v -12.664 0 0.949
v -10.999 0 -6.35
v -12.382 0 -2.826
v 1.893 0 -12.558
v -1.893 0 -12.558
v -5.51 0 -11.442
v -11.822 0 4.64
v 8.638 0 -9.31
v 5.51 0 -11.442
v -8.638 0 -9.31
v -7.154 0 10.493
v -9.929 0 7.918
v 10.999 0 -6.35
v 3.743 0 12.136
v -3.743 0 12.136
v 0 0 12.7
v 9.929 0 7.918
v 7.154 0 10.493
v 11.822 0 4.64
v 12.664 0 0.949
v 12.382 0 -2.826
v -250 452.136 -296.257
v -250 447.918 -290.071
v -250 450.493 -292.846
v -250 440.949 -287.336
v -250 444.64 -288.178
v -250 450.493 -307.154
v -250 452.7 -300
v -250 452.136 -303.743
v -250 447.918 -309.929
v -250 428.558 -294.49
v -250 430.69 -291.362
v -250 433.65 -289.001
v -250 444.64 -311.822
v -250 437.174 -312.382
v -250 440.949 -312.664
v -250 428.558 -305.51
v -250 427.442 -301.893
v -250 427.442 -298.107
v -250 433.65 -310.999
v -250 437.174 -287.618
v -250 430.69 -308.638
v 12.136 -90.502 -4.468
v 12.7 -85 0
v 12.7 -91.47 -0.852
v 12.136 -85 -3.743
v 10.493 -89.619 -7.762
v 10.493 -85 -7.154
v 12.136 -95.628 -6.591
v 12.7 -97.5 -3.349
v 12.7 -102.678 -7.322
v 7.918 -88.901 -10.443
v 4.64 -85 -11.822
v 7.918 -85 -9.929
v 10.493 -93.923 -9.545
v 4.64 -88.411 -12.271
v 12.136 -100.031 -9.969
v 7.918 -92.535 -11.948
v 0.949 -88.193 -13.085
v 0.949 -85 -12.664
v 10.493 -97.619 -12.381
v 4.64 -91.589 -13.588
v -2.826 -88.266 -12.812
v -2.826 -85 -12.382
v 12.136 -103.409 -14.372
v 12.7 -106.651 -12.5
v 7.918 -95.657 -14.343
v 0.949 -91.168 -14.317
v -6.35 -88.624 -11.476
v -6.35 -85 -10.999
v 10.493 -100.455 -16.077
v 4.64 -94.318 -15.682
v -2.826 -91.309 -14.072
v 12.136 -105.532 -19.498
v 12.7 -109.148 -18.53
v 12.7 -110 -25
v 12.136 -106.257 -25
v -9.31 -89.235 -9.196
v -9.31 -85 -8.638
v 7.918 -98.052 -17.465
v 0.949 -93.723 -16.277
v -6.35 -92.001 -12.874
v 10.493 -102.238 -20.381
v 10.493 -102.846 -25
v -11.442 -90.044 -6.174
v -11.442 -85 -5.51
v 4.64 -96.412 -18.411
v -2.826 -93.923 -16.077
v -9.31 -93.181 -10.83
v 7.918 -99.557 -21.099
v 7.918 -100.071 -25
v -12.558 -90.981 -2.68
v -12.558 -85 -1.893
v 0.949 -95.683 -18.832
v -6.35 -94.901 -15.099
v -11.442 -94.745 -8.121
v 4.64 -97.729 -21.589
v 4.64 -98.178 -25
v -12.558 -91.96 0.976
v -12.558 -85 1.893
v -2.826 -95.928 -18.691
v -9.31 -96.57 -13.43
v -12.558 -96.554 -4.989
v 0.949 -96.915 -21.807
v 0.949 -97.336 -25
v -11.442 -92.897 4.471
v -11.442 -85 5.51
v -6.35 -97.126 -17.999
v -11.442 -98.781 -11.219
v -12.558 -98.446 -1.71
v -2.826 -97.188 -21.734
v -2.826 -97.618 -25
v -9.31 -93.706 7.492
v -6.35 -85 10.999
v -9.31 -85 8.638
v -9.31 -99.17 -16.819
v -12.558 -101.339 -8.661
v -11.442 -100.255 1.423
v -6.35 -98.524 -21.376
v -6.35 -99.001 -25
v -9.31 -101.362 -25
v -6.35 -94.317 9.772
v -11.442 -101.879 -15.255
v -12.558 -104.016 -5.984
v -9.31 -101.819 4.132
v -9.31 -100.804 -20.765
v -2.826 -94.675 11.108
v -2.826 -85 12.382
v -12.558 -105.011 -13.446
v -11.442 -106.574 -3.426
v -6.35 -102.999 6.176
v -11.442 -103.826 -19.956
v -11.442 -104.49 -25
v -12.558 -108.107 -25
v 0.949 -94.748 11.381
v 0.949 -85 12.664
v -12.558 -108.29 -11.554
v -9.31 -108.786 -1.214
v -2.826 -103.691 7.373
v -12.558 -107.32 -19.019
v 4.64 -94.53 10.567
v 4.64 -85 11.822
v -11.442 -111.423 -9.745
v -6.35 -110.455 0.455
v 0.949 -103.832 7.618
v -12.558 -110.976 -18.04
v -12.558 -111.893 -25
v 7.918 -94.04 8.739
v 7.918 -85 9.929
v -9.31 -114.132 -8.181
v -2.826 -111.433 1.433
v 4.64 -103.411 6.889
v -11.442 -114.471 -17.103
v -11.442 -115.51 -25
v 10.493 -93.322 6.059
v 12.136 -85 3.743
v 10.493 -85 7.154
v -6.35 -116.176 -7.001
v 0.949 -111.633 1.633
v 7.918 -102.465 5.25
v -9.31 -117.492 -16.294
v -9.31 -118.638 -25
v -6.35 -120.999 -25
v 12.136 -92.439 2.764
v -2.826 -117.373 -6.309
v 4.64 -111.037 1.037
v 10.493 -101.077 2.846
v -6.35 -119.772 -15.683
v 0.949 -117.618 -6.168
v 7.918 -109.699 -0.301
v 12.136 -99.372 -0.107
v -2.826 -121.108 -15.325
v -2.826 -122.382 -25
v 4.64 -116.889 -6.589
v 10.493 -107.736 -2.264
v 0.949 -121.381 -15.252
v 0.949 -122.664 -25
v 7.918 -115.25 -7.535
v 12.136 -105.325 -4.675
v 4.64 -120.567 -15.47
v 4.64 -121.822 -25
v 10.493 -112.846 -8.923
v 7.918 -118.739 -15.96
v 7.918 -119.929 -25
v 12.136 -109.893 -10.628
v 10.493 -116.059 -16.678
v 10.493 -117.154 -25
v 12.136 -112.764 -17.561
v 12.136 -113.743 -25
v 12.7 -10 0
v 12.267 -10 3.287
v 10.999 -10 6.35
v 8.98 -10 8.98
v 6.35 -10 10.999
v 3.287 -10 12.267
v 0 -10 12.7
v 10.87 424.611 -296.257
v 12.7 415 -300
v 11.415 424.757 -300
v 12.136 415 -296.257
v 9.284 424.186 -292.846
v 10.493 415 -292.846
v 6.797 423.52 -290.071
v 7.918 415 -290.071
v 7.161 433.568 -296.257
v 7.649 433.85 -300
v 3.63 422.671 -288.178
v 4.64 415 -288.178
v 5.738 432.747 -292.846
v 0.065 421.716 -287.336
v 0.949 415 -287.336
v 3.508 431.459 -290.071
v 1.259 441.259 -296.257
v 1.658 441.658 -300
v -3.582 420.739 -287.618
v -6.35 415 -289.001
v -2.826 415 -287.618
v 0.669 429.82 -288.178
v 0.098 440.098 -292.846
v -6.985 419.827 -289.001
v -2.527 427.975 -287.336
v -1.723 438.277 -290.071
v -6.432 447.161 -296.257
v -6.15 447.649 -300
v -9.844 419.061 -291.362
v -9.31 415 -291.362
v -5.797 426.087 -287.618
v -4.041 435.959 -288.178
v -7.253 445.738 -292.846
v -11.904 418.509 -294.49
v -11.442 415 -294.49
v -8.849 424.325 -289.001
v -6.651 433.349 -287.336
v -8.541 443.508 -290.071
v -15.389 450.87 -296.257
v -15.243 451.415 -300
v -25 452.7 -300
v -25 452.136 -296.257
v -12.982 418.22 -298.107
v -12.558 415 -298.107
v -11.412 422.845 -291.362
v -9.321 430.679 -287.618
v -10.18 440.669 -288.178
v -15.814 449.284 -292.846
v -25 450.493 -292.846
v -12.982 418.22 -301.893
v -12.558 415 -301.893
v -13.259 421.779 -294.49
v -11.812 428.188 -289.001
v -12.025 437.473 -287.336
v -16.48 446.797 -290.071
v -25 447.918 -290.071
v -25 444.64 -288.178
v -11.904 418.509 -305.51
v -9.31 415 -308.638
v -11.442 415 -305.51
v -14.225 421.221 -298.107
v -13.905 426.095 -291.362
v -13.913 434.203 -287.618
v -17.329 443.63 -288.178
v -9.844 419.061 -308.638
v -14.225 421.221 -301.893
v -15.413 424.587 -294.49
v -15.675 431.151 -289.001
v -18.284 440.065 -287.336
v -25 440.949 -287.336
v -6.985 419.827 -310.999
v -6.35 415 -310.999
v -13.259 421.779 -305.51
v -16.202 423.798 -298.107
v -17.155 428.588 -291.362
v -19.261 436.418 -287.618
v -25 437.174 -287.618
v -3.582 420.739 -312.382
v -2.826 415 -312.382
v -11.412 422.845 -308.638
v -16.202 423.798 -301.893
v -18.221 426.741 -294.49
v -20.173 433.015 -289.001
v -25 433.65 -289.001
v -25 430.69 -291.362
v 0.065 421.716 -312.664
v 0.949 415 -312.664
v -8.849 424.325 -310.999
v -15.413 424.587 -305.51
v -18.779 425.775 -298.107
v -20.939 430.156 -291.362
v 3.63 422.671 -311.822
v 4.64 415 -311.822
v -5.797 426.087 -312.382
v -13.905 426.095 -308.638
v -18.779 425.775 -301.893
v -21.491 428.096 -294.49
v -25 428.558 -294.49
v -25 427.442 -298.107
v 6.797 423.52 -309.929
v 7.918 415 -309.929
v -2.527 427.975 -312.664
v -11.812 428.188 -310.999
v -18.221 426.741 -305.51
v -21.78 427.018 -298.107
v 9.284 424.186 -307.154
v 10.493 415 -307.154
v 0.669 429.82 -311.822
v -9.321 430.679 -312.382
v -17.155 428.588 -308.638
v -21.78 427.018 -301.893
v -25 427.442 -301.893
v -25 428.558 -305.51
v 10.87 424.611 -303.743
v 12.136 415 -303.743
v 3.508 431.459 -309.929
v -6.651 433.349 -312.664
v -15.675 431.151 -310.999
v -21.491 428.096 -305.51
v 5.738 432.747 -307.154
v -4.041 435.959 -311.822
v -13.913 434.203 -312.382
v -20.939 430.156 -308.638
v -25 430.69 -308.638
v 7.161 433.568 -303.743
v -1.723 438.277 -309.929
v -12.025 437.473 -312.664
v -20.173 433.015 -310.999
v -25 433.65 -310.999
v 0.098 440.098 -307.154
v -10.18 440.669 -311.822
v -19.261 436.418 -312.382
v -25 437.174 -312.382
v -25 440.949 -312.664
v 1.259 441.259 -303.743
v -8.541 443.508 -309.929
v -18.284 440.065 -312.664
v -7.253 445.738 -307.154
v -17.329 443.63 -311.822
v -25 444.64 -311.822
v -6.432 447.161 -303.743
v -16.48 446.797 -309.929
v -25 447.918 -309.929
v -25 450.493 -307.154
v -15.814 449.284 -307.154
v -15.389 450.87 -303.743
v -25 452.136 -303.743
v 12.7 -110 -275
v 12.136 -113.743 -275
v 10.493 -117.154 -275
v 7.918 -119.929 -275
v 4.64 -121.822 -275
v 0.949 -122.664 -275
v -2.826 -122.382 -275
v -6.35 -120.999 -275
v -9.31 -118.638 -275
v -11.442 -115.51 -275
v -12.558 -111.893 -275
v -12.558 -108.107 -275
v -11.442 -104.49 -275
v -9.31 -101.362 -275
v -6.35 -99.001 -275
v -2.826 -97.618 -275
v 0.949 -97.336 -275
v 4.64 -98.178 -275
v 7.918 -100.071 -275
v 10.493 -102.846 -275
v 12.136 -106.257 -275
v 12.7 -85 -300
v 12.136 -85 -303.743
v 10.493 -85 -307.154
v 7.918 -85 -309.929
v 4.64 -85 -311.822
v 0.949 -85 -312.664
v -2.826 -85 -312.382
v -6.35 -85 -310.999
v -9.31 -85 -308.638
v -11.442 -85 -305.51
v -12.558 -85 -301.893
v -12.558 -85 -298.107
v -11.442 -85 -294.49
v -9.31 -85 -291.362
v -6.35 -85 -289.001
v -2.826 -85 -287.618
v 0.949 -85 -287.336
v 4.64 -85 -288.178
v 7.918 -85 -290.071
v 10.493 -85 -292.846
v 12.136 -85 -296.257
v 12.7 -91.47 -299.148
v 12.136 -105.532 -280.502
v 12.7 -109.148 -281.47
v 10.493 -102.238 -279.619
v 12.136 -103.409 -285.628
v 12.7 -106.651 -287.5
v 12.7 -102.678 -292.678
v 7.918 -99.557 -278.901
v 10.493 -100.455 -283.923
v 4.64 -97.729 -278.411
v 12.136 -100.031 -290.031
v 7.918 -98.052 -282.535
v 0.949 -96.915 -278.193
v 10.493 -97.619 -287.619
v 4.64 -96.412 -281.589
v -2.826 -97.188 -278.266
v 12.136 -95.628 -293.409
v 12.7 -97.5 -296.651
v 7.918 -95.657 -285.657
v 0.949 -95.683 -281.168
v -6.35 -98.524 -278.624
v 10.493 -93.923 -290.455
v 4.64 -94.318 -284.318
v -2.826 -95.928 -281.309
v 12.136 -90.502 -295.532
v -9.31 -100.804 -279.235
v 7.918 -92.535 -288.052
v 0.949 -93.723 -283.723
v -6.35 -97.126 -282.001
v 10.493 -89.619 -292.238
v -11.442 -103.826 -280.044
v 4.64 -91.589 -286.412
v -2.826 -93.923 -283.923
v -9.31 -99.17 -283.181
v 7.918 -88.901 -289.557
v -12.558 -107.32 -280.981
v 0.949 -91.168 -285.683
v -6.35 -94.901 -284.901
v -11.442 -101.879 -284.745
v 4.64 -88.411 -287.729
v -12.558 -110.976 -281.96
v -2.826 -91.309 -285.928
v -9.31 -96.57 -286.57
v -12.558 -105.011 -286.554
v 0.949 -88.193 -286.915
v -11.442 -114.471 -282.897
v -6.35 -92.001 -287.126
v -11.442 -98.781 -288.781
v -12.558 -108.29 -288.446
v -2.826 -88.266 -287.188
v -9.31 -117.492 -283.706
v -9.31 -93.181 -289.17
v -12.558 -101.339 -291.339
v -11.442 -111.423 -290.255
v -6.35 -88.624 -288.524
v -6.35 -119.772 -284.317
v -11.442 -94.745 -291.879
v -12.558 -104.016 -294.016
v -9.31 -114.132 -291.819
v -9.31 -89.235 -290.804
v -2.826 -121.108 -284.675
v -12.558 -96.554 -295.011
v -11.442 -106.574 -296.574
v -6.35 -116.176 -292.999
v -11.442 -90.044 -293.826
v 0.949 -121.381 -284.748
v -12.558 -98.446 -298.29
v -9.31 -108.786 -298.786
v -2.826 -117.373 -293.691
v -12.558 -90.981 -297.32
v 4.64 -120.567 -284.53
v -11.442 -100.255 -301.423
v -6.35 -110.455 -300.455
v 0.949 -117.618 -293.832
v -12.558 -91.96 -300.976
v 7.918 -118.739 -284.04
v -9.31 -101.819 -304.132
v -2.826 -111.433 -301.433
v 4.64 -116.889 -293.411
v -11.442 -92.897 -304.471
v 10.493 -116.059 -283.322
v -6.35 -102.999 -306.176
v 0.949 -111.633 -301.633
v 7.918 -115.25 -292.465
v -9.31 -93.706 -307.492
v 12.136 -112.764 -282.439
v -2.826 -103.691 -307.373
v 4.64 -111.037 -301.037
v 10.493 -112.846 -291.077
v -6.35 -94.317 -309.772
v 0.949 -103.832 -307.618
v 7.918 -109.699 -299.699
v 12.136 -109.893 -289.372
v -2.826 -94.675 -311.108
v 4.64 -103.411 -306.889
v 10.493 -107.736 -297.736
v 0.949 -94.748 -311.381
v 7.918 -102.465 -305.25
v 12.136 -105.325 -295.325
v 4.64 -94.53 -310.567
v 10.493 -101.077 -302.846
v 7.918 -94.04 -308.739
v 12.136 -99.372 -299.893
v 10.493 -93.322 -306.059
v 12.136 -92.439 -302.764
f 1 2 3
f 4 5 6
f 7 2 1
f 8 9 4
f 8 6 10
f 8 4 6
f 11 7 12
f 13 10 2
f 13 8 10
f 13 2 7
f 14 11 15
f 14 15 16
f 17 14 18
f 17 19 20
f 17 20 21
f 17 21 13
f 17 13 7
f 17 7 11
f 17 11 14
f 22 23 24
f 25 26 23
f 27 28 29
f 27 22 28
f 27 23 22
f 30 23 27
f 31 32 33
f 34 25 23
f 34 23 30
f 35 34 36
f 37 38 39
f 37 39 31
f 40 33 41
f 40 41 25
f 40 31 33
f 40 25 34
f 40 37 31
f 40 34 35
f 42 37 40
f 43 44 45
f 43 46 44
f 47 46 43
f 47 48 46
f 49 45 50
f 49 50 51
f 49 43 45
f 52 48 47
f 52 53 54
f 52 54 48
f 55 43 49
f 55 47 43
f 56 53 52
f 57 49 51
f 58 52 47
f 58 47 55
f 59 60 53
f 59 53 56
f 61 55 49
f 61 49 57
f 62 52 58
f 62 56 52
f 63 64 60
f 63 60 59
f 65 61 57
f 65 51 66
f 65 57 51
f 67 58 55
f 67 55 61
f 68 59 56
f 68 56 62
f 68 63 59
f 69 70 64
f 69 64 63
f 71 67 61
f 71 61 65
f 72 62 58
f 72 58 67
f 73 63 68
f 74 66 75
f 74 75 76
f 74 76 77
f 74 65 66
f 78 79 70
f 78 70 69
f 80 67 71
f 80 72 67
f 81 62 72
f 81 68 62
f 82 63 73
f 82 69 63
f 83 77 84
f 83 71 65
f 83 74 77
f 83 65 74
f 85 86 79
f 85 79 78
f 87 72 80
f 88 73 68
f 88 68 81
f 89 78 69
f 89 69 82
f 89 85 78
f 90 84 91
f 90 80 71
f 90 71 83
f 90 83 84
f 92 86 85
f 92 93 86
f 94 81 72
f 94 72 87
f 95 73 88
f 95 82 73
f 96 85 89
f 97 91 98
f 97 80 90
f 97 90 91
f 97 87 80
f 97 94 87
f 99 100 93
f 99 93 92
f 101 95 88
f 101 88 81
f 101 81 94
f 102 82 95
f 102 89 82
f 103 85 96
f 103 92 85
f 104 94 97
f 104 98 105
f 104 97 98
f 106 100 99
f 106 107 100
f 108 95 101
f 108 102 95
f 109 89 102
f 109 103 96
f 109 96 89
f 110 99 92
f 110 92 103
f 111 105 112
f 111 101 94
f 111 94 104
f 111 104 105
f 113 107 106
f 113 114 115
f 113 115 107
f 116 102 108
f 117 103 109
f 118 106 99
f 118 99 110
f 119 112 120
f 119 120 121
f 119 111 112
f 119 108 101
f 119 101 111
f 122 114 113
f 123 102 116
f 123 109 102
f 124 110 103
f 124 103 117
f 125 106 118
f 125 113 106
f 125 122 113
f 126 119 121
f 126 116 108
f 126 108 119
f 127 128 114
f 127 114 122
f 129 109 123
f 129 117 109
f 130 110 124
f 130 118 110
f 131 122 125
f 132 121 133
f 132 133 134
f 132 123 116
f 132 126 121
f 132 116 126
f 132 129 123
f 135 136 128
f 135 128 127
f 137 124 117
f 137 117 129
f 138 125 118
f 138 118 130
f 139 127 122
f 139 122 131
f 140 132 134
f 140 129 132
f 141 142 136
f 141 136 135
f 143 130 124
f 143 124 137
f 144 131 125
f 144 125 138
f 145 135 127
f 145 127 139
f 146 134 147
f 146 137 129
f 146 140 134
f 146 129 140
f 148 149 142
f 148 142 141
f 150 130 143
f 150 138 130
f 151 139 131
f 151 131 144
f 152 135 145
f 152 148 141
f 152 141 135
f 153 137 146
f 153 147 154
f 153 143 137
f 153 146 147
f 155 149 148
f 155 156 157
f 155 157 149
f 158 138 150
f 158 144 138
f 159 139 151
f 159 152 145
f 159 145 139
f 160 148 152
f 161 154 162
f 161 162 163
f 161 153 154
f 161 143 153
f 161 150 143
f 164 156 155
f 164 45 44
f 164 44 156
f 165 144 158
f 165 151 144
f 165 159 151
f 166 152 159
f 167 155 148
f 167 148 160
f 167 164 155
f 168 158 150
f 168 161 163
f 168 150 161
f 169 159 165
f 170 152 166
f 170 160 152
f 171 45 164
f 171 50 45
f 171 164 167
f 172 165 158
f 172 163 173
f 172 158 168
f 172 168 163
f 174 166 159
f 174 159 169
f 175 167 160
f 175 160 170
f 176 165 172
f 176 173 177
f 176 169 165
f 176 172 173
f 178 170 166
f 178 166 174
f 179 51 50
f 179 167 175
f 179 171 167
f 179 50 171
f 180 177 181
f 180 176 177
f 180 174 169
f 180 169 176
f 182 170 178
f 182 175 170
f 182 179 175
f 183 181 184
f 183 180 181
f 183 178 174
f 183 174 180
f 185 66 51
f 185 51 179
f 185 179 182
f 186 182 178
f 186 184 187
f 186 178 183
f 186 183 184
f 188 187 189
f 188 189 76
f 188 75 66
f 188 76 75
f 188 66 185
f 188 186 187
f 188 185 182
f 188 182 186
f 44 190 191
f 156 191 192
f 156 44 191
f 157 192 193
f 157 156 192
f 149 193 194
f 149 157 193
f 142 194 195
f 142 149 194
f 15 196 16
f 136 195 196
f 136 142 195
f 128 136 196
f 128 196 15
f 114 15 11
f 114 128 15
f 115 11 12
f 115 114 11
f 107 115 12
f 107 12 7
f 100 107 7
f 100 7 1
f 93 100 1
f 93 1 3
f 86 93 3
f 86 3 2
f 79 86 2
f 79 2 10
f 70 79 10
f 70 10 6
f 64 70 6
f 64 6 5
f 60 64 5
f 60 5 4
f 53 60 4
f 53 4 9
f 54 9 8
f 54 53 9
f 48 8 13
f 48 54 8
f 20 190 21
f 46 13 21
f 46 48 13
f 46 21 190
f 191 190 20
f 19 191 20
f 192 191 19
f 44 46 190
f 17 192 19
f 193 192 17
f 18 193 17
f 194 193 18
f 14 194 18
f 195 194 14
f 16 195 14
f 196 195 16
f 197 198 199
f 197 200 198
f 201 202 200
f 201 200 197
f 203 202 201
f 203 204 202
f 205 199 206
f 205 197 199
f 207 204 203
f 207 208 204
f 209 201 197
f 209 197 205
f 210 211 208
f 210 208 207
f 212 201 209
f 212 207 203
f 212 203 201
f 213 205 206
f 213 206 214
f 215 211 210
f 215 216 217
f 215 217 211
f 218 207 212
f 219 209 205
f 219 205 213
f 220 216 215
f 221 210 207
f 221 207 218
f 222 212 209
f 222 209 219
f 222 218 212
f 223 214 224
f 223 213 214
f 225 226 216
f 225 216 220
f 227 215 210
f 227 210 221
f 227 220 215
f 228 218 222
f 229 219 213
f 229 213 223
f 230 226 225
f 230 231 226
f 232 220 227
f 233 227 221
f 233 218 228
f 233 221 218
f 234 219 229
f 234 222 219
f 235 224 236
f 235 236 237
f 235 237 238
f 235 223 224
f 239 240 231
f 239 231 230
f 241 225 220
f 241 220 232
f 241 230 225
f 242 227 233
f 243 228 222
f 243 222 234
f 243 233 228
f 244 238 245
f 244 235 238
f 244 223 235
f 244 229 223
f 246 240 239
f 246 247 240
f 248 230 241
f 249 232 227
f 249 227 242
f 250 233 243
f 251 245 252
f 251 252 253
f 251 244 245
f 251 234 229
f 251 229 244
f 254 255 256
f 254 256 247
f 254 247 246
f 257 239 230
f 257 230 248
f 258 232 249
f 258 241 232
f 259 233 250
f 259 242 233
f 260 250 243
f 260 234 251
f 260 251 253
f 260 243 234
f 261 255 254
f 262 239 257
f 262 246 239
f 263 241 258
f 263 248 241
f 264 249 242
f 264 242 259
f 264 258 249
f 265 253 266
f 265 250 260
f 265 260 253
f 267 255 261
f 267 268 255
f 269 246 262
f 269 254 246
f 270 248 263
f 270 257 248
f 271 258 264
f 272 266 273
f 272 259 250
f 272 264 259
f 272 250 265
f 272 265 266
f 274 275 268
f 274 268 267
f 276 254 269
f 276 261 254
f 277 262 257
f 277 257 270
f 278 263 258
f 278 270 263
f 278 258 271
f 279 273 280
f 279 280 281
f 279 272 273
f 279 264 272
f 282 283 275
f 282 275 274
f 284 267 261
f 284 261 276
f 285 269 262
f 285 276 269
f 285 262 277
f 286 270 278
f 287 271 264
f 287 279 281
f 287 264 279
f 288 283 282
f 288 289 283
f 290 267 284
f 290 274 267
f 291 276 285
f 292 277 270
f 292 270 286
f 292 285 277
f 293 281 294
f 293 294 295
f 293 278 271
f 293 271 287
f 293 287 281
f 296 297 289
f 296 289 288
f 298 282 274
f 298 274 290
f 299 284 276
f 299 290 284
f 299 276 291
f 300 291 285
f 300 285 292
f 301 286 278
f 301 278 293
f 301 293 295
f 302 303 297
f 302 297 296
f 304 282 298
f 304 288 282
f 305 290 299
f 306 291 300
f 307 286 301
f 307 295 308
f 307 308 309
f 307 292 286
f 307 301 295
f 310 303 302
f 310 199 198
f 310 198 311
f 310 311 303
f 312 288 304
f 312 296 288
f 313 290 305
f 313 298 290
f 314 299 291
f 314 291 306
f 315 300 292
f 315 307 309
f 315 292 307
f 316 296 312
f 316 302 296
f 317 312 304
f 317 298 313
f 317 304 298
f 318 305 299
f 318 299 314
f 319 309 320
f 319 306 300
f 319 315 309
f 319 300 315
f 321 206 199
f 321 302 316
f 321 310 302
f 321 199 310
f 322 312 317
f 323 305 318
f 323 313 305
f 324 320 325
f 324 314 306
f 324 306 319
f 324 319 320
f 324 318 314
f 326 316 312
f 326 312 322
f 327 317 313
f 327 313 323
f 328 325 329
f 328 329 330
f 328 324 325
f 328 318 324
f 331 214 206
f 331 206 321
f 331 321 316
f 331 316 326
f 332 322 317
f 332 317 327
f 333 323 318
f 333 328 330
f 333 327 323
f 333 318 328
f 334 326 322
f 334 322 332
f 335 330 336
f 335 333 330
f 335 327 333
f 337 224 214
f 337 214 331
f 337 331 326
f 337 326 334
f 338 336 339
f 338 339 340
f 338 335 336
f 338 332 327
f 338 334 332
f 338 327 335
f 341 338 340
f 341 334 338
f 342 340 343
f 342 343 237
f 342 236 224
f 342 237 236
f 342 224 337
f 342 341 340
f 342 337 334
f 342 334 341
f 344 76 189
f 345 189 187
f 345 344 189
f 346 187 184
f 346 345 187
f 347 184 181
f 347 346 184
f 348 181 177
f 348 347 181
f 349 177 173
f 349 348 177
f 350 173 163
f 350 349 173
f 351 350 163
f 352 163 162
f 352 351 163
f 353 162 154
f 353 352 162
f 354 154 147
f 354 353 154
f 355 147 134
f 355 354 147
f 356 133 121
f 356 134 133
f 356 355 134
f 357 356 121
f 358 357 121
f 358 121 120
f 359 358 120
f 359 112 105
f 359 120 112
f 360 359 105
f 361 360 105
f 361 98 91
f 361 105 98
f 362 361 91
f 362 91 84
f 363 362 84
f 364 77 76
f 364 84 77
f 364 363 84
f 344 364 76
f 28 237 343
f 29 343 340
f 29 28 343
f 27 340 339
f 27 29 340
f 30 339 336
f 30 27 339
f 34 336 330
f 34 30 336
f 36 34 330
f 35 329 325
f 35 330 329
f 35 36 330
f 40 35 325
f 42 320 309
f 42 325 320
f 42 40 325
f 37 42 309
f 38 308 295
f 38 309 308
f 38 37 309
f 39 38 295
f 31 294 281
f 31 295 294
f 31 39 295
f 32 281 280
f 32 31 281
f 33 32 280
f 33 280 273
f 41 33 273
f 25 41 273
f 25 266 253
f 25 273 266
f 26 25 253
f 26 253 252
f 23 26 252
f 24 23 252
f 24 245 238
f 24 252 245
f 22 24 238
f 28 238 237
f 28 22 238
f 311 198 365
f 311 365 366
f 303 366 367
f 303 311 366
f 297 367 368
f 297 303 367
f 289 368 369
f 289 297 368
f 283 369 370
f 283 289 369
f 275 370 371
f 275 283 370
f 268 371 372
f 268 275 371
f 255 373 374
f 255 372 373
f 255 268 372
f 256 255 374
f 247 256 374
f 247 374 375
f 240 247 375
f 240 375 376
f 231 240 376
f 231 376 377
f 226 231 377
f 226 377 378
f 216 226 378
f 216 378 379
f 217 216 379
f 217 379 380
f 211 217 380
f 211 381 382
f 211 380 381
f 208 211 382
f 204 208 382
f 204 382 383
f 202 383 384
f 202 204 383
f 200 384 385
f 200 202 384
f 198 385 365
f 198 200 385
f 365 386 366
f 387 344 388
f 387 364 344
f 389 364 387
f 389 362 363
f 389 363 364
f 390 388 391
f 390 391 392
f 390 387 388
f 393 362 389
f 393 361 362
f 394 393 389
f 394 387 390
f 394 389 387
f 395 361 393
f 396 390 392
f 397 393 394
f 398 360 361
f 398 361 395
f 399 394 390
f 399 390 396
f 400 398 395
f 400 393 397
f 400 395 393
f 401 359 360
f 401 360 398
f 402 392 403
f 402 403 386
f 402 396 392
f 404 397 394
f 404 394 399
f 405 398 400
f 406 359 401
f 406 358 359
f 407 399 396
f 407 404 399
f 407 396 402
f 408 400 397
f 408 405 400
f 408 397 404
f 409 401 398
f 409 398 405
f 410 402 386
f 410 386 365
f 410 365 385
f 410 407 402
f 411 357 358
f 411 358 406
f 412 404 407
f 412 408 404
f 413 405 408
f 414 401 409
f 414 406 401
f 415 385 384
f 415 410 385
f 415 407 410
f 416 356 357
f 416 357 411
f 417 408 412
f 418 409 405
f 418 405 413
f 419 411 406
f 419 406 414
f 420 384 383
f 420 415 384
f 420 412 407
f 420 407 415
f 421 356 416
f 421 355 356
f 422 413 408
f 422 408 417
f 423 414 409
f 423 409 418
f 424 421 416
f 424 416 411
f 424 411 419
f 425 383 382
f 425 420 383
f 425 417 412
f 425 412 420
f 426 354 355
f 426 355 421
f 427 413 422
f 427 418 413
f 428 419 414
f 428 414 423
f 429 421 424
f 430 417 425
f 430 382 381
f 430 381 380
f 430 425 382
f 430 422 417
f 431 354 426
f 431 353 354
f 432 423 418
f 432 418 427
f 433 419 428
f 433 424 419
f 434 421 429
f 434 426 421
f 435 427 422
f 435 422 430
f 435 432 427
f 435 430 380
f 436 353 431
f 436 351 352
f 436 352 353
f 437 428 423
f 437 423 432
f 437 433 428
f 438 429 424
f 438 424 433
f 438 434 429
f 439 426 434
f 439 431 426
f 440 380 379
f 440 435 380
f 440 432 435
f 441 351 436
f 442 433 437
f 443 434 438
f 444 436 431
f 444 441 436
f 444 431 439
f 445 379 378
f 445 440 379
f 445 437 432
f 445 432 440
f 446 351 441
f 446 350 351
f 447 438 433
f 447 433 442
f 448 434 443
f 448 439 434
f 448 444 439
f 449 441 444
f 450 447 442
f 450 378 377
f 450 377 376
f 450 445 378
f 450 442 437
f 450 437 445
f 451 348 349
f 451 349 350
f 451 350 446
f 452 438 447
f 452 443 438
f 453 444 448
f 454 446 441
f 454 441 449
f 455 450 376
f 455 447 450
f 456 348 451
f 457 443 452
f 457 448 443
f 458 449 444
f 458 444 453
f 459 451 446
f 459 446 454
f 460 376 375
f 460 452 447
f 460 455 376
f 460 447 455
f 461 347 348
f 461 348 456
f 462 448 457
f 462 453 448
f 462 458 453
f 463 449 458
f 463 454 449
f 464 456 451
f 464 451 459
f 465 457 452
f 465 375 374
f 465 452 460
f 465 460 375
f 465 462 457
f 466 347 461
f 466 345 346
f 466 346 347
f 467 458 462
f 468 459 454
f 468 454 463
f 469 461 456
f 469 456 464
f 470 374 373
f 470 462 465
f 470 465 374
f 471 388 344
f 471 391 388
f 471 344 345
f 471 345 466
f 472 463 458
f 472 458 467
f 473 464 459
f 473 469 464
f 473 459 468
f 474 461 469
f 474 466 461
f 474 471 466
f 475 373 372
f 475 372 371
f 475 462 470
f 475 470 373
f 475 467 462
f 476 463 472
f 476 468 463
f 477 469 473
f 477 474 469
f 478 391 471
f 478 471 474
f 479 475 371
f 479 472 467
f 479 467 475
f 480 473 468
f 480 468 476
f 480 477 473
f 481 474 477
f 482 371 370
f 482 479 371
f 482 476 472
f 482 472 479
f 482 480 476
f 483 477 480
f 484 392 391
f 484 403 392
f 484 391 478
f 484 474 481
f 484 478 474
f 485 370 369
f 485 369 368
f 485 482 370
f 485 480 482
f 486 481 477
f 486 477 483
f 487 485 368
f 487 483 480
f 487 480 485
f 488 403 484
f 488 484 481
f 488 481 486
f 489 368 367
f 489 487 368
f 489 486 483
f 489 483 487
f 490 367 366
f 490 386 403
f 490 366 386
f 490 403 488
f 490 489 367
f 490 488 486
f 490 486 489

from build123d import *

# Parameters (mm, degrees)
CROQUIS1_R              = 12.7
SALIENTE_EXTRUIR1_DEPTH = 10
CROQUIS2_R              = 12.7


with BuildPart() as part:
    # Croquis1 → Saliente-Extruir1 (new body)
    with BuildSketch(Plane(origin=(0, 0, 0), x_dir=(1, 0, 0), z_dir=(0, 1, 0))):
        with Locations(Location((0, 0, 0), (0, 0, 270))):
            Circle(CROQUIS1_R)
    extrude(amount=-SALIENTE_EXTRUIR1_DEPTH)

    # Barrer1: sweep along a curve in space
    with BuildLine() as barrer1_path:
        Line((0, -10, 0), (0, -85, 0))
        ThreePointArc((0, -85, 0), (0, -102.67766953, -7.32233047), (0, -110, -25))
        Line((0, -110, -25), (0, -110, -275))
        ThreePointArc((0, -110, -275), (0, -102.67766953, -292.67766953), (0, -85, -300))
        Line((0, -85, -300), (0, 415, -300))
        ThreePointArc((0, 415, -300), (-7.32233047, 432.67766953, -300), (-25, 440, -300))
        Line((-25, 440, -300), (-250, 440, -300))
    # Croquis2 → Barrer1 (sweep)
    with BuildSketch(Plane.XZ.offset(10)):
        Circle(CROQUIS2_R)
    sweep(path=barrer1_path.line)


solid = part.part
